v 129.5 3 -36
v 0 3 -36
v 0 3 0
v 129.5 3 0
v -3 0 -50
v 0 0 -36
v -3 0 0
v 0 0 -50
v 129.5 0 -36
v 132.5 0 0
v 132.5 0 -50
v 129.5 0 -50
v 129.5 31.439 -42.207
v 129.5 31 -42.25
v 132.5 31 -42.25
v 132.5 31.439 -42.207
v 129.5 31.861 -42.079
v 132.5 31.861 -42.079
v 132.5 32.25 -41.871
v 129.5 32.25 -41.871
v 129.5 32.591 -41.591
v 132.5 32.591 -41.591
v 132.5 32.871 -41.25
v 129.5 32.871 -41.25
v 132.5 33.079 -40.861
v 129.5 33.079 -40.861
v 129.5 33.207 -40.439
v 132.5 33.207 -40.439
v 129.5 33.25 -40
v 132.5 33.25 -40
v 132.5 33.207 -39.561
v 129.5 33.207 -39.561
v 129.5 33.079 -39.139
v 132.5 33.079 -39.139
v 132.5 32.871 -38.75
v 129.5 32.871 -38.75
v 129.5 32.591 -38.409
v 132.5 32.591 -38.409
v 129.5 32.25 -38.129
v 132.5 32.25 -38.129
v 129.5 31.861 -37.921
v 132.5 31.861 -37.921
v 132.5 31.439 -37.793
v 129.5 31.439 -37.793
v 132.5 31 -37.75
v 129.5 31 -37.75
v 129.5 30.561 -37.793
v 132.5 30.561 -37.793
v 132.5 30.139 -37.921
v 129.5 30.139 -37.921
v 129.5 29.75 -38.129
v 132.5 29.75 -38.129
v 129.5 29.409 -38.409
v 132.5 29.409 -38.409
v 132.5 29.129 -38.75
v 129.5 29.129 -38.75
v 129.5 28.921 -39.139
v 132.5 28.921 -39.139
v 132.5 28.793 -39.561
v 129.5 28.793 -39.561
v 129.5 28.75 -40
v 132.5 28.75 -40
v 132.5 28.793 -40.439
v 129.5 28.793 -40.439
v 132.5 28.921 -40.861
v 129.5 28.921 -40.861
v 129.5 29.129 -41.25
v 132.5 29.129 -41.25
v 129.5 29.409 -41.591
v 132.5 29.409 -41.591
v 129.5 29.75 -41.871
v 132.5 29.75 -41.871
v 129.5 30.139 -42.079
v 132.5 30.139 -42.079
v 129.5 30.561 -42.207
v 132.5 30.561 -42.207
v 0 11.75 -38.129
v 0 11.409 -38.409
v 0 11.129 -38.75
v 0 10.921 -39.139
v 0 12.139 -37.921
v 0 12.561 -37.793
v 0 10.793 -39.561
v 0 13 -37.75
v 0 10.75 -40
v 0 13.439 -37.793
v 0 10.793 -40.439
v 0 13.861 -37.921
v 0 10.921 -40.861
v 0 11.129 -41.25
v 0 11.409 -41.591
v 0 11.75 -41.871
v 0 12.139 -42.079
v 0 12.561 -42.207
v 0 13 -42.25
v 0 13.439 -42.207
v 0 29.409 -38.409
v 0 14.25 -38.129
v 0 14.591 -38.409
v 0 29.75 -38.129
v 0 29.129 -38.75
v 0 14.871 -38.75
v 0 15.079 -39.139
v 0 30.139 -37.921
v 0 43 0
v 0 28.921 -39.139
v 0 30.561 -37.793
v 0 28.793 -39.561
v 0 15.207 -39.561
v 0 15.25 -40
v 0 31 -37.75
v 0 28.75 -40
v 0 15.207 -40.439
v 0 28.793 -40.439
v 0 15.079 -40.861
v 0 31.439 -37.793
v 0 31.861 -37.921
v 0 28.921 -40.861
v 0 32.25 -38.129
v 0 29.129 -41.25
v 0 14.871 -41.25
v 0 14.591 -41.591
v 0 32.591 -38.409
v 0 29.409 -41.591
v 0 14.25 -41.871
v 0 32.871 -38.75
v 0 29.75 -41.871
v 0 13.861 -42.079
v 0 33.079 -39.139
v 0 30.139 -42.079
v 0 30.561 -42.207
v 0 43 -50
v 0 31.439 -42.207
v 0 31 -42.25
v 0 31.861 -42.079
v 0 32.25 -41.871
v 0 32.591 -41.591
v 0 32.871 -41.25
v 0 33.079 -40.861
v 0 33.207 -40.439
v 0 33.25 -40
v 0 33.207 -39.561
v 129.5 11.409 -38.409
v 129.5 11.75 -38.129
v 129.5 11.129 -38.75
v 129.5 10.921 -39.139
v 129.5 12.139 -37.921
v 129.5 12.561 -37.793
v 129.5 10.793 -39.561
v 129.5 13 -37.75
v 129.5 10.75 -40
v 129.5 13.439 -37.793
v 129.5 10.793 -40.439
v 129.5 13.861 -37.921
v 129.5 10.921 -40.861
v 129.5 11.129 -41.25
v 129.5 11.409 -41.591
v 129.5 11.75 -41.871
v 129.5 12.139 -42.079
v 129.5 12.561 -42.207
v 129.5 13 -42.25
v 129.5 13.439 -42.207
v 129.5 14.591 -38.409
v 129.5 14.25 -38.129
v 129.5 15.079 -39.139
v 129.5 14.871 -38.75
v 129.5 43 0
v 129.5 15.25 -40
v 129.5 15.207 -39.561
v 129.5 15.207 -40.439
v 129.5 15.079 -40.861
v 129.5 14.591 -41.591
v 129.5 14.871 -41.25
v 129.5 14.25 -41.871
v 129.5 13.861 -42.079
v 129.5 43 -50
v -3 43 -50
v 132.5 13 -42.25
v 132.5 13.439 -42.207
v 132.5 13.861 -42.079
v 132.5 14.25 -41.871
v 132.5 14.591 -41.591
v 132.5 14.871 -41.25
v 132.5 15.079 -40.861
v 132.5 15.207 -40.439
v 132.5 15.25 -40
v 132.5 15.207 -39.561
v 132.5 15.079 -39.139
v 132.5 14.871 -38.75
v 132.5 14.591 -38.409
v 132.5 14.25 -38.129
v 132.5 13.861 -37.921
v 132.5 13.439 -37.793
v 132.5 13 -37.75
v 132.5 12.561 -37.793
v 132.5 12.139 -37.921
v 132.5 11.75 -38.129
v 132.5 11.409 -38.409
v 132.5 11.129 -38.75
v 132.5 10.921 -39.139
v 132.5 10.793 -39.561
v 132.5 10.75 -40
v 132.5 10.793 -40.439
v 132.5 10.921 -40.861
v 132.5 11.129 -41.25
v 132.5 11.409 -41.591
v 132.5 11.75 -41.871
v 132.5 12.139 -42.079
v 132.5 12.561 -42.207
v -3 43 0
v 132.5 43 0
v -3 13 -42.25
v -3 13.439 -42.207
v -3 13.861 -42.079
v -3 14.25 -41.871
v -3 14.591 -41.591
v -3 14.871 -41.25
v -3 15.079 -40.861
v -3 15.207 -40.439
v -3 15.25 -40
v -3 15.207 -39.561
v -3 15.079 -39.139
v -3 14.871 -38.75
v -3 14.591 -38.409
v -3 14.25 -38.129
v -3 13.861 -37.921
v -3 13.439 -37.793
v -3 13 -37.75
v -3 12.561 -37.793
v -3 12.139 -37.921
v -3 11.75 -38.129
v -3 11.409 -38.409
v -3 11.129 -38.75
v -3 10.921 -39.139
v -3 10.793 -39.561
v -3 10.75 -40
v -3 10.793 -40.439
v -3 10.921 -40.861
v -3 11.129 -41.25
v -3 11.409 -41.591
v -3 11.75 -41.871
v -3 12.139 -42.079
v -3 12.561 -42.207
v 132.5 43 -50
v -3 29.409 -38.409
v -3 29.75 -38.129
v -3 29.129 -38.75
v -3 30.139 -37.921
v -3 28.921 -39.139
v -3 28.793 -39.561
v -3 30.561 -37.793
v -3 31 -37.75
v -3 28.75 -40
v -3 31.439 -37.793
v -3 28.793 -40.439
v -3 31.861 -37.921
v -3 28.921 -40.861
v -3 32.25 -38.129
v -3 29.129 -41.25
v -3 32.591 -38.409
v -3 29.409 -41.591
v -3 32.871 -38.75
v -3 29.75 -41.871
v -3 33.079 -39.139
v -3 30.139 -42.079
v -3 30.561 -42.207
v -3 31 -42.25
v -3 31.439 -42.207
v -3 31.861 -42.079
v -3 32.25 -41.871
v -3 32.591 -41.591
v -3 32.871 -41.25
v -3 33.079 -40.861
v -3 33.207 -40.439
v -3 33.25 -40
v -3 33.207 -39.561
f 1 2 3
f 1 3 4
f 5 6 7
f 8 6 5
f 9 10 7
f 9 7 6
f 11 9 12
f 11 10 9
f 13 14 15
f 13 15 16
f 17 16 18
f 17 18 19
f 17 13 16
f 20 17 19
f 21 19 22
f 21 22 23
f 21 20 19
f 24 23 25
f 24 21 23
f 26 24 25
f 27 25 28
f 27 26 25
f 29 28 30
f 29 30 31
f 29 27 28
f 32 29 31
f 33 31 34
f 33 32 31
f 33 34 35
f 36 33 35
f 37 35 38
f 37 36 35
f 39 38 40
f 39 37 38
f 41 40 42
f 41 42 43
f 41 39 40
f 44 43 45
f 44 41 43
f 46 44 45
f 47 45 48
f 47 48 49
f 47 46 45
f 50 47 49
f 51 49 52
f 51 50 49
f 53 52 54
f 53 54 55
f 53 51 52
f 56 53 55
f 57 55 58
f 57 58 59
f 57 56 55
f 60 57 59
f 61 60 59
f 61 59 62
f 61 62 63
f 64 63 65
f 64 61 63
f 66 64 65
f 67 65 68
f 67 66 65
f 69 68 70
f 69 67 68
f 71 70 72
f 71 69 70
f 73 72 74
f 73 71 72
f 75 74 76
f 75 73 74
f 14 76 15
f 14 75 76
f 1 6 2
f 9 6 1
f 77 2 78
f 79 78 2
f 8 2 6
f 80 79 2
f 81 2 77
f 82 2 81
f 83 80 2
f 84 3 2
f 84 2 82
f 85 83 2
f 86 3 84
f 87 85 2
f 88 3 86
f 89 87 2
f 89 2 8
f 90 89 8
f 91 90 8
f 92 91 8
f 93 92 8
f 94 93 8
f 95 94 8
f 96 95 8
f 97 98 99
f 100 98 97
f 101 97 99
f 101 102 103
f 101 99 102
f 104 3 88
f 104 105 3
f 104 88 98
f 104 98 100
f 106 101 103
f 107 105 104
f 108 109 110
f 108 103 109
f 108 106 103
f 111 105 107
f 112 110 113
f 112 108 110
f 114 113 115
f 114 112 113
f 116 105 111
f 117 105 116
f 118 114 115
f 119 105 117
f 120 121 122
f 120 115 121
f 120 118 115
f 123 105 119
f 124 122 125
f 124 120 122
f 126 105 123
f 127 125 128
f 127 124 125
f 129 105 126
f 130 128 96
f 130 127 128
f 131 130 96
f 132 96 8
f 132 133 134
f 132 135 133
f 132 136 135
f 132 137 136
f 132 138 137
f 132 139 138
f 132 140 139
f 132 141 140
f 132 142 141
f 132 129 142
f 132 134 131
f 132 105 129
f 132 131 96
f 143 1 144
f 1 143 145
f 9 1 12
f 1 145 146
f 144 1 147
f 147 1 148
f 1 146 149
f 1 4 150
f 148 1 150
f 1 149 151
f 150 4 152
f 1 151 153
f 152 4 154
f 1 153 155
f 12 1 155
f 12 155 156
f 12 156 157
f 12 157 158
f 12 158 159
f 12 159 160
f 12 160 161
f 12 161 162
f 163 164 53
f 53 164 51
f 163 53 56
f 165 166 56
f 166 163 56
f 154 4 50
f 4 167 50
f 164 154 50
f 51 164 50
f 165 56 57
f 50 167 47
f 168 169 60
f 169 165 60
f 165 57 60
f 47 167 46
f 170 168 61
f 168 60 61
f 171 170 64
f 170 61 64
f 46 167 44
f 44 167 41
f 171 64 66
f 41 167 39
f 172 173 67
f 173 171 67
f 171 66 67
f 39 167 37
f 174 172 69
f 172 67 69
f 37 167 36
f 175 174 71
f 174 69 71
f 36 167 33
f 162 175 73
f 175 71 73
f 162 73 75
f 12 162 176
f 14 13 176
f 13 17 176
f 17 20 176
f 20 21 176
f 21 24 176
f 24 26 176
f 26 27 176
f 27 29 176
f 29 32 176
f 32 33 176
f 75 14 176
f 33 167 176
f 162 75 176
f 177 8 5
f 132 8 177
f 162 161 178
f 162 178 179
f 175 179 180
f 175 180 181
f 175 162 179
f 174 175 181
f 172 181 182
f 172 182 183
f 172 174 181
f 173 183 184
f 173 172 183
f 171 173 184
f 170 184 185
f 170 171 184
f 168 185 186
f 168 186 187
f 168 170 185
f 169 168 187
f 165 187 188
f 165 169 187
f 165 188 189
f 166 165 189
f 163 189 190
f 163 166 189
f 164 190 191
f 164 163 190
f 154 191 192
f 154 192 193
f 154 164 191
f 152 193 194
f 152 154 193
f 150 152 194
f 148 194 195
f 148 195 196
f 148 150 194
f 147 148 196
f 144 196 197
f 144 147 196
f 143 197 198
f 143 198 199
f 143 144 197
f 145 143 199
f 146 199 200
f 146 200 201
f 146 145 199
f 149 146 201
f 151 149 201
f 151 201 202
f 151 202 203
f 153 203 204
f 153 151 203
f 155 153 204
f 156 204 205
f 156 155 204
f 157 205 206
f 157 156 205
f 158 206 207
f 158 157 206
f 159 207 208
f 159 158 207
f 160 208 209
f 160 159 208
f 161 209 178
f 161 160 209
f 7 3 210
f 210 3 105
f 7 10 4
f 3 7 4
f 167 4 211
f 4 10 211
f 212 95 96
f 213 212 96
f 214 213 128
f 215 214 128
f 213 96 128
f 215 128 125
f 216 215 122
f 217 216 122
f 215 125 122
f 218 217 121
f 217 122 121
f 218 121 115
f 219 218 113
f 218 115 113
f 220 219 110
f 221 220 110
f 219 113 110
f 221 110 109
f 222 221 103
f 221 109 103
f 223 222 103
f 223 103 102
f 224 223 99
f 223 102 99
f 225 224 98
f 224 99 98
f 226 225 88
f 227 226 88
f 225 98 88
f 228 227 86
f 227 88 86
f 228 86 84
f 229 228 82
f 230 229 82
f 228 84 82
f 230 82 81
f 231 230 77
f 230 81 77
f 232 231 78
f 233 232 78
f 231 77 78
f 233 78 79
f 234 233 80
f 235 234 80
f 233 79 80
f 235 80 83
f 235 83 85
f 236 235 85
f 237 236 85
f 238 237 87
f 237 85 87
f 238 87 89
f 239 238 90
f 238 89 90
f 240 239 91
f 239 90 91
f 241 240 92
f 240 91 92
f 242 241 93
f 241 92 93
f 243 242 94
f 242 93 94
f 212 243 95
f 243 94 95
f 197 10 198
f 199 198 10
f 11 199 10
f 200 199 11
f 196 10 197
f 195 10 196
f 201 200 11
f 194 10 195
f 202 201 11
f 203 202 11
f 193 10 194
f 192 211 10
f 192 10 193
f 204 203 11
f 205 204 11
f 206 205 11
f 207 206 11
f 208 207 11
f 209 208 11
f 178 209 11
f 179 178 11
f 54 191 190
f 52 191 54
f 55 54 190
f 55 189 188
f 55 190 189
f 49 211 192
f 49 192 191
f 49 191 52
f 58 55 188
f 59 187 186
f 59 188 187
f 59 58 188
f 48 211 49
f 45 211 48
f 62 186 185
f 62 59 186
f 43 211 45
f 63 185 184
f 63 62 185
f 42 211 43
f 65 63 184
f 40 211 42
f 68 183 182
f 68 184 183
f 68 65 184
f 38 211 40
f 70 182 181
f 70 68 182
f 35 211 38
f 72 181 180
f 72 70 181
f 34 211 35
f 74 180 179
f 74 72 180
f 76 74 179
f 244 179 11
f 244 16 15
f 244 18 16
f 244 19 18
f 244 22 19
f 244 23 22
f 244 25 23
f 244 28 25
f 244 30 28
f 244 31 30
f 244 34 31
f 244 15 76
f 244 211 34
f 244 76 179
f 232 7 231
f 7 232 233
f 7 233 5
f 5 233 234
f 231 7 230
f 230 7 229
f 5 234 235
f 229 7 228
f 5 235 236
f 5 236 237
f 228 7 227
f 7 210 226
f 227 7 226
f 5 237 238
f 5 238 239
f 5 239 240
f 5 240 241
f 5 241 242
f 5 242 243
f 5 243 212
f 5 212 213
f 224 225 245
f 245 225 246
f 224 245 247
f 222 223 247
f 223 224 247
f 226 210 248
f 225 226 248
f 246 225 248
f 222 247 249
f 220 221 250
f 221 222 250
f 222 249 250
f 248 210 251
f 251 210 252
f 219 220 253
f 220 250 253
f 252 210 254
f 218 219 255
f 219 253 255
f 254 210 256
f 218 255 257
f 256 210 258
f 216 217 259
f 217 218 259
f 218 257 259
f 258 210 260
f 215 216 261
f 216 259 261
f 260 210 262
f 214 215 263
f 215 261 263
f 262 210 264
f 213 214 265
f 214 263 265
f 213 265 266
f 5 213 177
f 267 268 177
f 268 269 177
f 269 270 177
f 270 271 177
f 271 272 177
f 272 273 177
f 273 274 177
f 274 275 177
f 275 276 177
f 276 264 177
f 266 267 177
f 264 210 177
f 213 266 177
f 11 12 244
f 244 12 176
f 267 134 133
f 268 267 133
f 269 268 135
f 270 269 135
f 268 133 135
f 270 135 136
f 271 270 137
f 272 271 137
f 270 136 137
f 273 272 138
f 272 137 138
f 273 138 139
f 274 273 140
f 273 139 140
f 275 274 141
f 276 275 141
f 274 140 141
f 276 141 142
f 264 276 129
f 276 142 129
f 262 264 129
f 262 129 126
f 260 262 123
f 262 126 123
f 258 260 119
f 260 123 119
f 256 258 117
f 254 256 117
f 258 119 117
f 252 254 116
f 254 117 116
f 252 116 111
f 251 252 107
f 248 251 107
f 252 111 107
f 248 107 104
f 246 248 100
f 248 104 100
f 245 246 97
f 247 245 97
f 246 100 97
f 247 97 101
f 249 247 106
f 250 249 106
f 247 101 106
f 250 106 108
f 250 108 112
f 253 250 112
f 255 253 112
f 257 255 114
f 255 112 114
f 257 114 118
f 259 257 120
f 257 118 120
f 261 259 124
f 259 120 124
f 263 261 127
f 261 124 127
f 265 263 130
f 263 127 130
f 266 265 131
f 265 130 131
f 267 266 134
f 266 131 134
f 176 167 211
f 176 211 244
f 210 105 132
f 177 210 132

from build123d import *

# Parameters (mm, degrees)
SKETCH1_W           = 129.5
SKETCH1_H           = 36
BOSS_EXTRUDE1_DEPTH = 3
SKETCH2_W           = 50
SKETCH2_H           = 43
SKETCH2_R           = 2.25
BOSS_EXTRUDE2_DEPTH = 3


with BuildPart() as part:
    # Sketch1 → Boss-Extrude1 (new body)
    with BuildSketch(Plane(origin=(0, 0, 0), x_dir=(1, 0, 0), z_dir=(0, 1, 0))):
        with Locations((64.75, 18)):
            Rectangle(SKETCH1_W, SKETCH1_H)
    extrude(amount=BOSS_EXTRUDE1_DEPTH)

    # Sketch2 → Boss-Extrude2 (add)
    with BuildSketch(Plane(origin=(129.5, 0, 0), x_dir=(0, 0, -1), z_dir=(1, 0, 0))):
        with Locations((25, 21.5)):
            Rectangle(SKETCH2_W, SKETCH2_H)
        with Locations((40, 31)):
            Circle(SKETCH2_R, mode=Mode.SUBTRACT)
        with Locations((40, 13)):
            Circle(SKETCH2_R, mode=Mode.SUBTRACT)
    boss_extrude2 = extrude(amount=BOSS_EXTRUDE2_DEPTH)

    # Mirror1: Boss-Extrude2 across plane
    add(boss_extrude2.mirror(Plane(origin=(64.75, 0, 0), x_dir=(0, 0, 1), z_dir=(1, 0, 0))))


solid = part.part
